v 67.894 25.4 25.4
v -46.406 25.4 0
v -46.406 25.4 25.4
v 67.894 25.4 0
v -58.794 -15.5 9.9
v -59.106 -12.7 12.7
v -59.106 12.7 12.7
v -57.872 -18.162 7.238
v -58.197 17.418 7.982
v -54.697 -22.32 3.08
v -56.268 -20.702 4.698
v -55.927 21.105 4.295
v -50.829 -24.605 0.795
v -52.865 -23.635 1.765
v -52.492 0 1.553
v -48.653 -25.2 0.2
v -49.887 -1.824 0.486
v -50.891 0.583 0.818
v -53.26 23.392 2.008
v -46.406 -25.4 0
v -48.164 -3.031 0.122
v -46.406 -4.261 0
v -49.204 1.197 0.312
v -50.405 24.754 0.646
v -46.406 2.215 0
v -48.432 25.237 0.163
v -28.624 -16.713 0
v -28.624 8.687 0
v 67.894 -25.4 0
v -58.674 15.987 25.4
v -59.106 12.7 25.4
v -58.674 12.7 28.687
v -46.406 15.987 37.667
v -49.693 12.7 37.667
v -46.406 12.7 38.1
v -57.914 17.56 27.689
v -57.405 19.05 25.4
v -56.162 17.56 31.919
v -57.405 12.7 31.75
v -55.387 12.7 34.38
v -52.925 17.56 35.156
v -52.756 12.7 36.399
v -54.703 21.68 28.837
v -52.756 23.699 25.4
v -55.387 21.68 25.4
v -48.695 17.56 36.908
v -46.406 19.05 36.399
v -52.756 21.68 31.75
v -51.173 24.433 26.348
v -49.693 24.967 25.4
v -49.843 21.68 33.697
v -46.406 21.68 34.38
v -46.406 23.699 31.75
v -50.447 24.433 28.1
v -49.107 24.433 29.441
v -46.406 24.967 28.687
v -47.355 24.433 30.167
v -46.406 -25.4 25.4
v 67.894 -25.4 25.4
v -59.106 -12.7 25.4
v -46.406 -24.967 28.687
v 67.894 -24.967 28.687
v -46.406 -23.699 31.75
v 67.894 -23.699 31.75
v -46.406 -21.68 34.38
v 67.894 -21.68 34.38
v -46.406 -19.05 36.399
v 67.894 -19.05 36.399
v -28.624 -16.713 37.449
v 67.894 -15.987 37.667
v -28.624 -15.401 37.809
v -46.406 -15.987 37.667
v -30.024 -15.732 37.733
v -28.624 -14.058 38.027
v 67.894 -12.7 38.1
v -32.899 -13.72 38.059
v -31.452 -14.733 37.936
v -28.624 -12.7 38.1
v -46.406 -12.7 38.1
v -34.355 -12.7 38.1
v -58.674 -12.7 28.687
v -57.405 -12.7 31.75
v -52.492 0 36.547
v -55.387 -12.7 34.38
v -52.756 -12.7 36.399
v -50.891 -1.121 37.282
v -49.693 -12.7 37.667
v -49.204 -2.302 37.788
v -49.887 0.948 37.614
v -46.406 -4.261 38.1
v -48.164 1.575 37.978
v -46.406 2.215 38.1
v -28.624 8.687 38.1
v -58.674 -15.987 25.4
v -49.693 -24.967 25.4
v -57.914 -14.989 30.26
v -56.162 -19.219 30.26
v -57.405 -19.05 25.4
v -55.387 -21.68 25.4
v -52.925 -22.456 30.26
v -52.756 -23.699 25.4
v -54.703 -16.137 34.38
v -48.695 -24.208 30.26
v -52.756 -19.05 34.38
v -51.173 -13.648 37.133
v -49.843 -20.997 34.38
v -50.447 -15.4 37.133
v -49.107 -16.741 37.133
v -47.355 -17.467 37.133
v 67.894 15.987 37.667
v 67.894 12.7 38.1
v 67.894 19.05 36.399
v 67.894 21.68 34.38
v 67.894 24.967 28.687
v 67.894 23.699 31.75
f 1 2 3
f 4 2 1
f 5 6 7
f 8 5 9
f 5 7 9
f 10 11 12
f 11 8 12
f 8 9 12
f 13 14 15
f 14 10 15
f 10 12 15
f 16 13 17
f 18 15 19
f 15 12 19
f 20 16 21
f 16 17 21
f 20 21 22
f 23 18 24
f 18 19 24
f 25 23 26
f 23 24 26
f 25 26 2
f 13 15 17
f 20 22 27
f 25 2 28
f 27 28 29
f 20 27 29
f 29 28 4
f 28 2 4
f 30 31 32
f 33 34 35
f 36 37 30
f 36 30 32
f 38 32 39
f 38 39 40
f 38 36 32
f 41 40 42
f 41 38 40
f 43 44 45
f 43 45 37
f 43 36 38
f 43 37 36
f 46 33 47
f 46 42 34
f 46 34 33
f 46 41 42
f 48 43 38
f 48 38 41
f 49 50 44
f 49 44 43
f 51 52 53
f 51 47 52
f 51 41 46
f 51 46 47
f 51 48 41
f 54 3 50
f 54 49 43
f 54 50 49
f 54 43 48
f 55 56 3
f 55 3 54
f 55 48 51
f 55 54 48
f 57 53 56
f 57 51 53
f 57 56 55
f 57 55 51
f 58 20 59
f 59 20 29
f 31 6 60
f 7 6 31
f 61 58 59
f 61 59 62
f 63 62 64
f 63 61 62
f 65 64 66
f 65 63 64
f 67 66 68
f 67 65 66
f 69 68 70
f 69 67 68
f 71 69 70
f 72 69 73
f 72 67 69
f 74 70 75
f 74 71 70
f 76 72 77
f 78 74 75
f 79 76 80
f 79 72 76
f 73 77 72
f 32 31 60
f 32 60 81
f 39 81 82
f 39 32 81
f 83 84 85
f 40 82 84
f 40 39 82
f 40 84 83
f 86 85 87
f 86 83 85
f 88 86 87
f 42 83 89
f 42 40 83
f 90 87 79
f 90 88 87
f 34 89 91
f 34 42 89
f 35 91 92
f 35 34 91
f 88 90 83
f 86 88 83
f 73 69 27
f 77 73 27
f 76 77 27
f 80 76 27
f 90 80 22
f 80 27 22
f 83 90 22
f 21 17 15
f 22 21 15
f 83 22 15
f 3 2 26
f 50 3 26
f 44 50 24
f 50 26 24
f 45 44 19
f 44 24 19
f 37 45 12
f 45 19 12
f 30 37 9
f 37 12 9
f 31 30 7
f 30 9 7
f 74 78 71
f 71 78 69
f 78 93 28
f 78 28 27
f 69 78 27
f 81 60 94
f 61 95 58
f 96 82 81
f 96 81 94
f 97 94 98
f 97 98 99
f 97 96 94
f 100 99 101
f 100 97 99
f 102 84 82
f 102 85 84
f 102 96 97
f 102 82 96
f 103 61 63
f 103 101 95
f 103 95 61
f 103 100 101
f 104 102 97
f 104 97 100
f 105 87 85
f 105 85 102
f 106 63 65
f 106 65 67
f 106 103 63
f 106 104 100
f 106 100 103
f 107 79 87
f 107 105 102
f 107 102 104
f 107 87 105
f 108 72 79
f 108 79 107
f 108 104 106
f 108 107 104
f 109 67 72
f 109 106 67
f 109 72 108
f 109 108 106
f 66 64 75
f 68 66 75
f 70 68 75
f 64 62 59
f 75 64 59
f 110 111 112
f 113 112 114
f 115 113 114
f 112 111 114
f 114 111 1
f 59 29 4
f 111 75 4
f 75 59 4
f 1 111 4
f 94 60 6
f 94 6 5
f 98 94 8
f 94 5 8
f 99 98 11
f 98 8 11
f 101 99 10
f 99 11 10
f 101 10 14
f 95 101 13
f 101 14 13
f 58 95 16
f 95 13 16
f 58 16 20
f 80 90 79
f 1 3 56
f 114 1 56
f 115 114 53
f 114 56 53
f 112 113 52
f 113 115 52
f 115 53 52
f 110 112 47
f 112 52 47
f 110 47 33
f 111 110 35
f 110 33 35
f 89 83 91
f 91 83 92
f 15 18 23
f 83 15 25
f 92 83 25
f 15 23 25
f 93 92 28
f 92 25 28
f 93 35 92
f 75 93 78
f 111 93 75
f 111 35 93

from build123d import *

# Parameters (mm, degrees)
F0_W         = 127
F0_H         = 50.8
F1_DEPTH     = 38.1
F2_T1_DEPTH  = 57.15
F2_T3_DEPTH  = 114.3
F2_T5_DEPTH  = 25.4
F2_T7_DEPTH  = 146.05
F2_S11_W     = 12.7
F2_S11_H     = 12.7
F2_T12_DEPTH = 12.7
F2_S17_W     = 12.7
F2_S17_H     = 12.7
F2_T18_DEPTH = 12.7


# Not quite as in the source:
# - a fillet or chamfer that OpenCascade refuses, or shapes differently, is made with other operations: its cross-section is extruded or revolved along the edge and cut away or added


with BuildPart() as f1:
    # F0 (on Top) → F1 (new body)
    with BuildSketch(Plane.XY):
        with Locations((4.3936092407, 0)):
            Rectangle(F0_W, F0_H)
        Polygon((-28.6239193533, -16.7126883595), (-52.4921119213, 0), (-28.6239193533, 8.6873116405), align=None, mode=Mode.SUBTRACT)
    extrude(amount=F1_DEPTH)

    # F2: fillet of radius 12.7 on 6 edges, made by hand

    # F2_s2 → F2_t1 (cut)
    with BuildSketch(Plane.XY.offset(-31.75)):
        with BuildLine():
            ThreePointArc((-46.4063907593, 25.4), (-55.3866468804, 21.6802561211), (-59.1063907593, 12.7))
            Line((-59.1063907593, 12.7), (-59.1063907593, 25.4))
            Line((-59.1063907593, 25.4), (-46.4063907593, 25.4))
        make_face()
        with BuildLine():
            ThreePointArc((-59.1063907593, -12.7), (-55.3866468804, -21.6802561211), (-46.4063907593, -25.4))
            Line((-46.4063907593, -25.4), (-59.1063907593, -25.4))
            Line((-59.1063907593, -25.4), (-59.1063907593, -12.7))
        make_face()
    extrude(amount=F2_T1_DEPTH, mode=Mode.SUBTRACT)

    # F2_s4 → F2_t3 (cut)
    with BuildSketch(Plane.XZ.offset(-57.15)):
        with BuildLine():
            ThreePointArc((-59.1063907593, 12.7), (-55.3866468804, 3.7197438789), (-46.4063907593, 0))
            Line((-46.4063907593, 0), (-59.1063907593, 0))
            Line((-59.1063907593, 0), (-59.1063907593, 12.7))
        make_face()
    extrude(amount=F2_T3_DEPTH, mode=Mode.SUBTRACT)

    # F2_s6 → F2_t5 (cut)
    with BuildSketch(Plane.XZ.offset(-12.7)):
        with BuildLine():
            ThreePointArc((-59.1063907593, 25.4), (-55.3866468804, 34.3802561211), (-46.4063907593, 38.1))
            Line((-46.4063907593, 38.1), (-59.1063907593, 38.1))
            Line((-59.1063907593, 38.1), (-59.1063907593, 25.4))
        make_face()
    extrude(amount=F2_T5_DEPTH, mode=Mode.SUBTRACT)

    # F2_s8 → F2_t7 (cut)
    with BuildSketch(Plane.YZ.offset(-46.4063907593)):
        with BuildLine():
            ThreePointArc((-25.4, 25.4), (-21.6802561211, 34.3802561211), (-12.7, 38.1))
            Line((-12.7, 38.1), (-25.4, 38.1))
            Line((-25.4, 38.1), (-25.4, 25.4))
        make_face()
        with BuildLine():
            ThreePointArc((25.4, 25.4), (21.6802561211, 34.3802561211), (12.7, 38.1))
            Line((12.7, 38.1), (25.4, 38.1))
            Line((25.4, 38.1), (25.4, 25.4))
        make_face()
    extrude(amount=F2_T7_DEPTH, mode=Mode.SUBTRACT)


with BuildPart() as f2_tool10:
    # F2_s11 → F2_t12 (new body)
    with BuildSketch(Plane.XZ.offset(-12.7)):
        with Locations((-52.7563907593, 31.75)):
            Rectangle(F2_S11_W, F2_S11_H)
    extrude(amount=-F2_T12_DEPTH)

    # F2_s13 → F2_t14 (revolve, cut)
    with BuildSketch(Plane(origin=(-46.4063907593, 12.7, 25.4), x_dir=(0.7071067812, 0, -0.7071067812), z_dir=(0.7071067812, 0, 0.7071067812))):
        with BuildLine():
            ThreePointArc((0, -12.7), (12.7, 0), (0, 12.7))
            Line((0, 12.7), (0, -12.7))
        make_face()
    revolve(axis=Axis((-46.4063907593, 12.7, 25.4), (0, 1, 0)), mode=Mode.SUBTRACT)


with BuildPart() as f1_1:
    add(f1.part)

    # F2_t9: cut F2_tool10
    add(f2_tool10.part, mode=Mode.SUBTRACT)


with BuildPart() as f2_tool16:
    # F2_s17 → F2_t18 (new body)
    with BuildSketch(Plane.XY.offset(25.4)):
        with Locations((-52.7563907593, -19.05)):
            Rectangle(F2_S17_W, F2_S17_H)
    extrude(amount=F2_T18_DEPTH)

    # F2_s19 → F2_t20 (revolve, cut)
    with BuildSketch(Plane(origin=(-46.4063907593, -12.7, 25.4), x_dir=(0.7071067812, 0.7071067812, 0), z_dir=(0.7071067812, -0.7071067812, 0))):
        with BuildLine():
            ThreePointArc((0, -12.7), (12.7, 0), (0, 12.7))
            Line((0, 12.7), (0, -12.7))
        make_face()
    revolve(axis=Axis((-46.4063907593, -12.7, 25.4), (0, 0, 1)), mode=Mode.SUBTRACT)


with BuildPart() as f1_2:
    add(f1_1.part)

    # F2_t15: cut F2_tool16
    add(f2_tool16.part, mode=Mode.SUBTRACT)


solid = f1_2.part
